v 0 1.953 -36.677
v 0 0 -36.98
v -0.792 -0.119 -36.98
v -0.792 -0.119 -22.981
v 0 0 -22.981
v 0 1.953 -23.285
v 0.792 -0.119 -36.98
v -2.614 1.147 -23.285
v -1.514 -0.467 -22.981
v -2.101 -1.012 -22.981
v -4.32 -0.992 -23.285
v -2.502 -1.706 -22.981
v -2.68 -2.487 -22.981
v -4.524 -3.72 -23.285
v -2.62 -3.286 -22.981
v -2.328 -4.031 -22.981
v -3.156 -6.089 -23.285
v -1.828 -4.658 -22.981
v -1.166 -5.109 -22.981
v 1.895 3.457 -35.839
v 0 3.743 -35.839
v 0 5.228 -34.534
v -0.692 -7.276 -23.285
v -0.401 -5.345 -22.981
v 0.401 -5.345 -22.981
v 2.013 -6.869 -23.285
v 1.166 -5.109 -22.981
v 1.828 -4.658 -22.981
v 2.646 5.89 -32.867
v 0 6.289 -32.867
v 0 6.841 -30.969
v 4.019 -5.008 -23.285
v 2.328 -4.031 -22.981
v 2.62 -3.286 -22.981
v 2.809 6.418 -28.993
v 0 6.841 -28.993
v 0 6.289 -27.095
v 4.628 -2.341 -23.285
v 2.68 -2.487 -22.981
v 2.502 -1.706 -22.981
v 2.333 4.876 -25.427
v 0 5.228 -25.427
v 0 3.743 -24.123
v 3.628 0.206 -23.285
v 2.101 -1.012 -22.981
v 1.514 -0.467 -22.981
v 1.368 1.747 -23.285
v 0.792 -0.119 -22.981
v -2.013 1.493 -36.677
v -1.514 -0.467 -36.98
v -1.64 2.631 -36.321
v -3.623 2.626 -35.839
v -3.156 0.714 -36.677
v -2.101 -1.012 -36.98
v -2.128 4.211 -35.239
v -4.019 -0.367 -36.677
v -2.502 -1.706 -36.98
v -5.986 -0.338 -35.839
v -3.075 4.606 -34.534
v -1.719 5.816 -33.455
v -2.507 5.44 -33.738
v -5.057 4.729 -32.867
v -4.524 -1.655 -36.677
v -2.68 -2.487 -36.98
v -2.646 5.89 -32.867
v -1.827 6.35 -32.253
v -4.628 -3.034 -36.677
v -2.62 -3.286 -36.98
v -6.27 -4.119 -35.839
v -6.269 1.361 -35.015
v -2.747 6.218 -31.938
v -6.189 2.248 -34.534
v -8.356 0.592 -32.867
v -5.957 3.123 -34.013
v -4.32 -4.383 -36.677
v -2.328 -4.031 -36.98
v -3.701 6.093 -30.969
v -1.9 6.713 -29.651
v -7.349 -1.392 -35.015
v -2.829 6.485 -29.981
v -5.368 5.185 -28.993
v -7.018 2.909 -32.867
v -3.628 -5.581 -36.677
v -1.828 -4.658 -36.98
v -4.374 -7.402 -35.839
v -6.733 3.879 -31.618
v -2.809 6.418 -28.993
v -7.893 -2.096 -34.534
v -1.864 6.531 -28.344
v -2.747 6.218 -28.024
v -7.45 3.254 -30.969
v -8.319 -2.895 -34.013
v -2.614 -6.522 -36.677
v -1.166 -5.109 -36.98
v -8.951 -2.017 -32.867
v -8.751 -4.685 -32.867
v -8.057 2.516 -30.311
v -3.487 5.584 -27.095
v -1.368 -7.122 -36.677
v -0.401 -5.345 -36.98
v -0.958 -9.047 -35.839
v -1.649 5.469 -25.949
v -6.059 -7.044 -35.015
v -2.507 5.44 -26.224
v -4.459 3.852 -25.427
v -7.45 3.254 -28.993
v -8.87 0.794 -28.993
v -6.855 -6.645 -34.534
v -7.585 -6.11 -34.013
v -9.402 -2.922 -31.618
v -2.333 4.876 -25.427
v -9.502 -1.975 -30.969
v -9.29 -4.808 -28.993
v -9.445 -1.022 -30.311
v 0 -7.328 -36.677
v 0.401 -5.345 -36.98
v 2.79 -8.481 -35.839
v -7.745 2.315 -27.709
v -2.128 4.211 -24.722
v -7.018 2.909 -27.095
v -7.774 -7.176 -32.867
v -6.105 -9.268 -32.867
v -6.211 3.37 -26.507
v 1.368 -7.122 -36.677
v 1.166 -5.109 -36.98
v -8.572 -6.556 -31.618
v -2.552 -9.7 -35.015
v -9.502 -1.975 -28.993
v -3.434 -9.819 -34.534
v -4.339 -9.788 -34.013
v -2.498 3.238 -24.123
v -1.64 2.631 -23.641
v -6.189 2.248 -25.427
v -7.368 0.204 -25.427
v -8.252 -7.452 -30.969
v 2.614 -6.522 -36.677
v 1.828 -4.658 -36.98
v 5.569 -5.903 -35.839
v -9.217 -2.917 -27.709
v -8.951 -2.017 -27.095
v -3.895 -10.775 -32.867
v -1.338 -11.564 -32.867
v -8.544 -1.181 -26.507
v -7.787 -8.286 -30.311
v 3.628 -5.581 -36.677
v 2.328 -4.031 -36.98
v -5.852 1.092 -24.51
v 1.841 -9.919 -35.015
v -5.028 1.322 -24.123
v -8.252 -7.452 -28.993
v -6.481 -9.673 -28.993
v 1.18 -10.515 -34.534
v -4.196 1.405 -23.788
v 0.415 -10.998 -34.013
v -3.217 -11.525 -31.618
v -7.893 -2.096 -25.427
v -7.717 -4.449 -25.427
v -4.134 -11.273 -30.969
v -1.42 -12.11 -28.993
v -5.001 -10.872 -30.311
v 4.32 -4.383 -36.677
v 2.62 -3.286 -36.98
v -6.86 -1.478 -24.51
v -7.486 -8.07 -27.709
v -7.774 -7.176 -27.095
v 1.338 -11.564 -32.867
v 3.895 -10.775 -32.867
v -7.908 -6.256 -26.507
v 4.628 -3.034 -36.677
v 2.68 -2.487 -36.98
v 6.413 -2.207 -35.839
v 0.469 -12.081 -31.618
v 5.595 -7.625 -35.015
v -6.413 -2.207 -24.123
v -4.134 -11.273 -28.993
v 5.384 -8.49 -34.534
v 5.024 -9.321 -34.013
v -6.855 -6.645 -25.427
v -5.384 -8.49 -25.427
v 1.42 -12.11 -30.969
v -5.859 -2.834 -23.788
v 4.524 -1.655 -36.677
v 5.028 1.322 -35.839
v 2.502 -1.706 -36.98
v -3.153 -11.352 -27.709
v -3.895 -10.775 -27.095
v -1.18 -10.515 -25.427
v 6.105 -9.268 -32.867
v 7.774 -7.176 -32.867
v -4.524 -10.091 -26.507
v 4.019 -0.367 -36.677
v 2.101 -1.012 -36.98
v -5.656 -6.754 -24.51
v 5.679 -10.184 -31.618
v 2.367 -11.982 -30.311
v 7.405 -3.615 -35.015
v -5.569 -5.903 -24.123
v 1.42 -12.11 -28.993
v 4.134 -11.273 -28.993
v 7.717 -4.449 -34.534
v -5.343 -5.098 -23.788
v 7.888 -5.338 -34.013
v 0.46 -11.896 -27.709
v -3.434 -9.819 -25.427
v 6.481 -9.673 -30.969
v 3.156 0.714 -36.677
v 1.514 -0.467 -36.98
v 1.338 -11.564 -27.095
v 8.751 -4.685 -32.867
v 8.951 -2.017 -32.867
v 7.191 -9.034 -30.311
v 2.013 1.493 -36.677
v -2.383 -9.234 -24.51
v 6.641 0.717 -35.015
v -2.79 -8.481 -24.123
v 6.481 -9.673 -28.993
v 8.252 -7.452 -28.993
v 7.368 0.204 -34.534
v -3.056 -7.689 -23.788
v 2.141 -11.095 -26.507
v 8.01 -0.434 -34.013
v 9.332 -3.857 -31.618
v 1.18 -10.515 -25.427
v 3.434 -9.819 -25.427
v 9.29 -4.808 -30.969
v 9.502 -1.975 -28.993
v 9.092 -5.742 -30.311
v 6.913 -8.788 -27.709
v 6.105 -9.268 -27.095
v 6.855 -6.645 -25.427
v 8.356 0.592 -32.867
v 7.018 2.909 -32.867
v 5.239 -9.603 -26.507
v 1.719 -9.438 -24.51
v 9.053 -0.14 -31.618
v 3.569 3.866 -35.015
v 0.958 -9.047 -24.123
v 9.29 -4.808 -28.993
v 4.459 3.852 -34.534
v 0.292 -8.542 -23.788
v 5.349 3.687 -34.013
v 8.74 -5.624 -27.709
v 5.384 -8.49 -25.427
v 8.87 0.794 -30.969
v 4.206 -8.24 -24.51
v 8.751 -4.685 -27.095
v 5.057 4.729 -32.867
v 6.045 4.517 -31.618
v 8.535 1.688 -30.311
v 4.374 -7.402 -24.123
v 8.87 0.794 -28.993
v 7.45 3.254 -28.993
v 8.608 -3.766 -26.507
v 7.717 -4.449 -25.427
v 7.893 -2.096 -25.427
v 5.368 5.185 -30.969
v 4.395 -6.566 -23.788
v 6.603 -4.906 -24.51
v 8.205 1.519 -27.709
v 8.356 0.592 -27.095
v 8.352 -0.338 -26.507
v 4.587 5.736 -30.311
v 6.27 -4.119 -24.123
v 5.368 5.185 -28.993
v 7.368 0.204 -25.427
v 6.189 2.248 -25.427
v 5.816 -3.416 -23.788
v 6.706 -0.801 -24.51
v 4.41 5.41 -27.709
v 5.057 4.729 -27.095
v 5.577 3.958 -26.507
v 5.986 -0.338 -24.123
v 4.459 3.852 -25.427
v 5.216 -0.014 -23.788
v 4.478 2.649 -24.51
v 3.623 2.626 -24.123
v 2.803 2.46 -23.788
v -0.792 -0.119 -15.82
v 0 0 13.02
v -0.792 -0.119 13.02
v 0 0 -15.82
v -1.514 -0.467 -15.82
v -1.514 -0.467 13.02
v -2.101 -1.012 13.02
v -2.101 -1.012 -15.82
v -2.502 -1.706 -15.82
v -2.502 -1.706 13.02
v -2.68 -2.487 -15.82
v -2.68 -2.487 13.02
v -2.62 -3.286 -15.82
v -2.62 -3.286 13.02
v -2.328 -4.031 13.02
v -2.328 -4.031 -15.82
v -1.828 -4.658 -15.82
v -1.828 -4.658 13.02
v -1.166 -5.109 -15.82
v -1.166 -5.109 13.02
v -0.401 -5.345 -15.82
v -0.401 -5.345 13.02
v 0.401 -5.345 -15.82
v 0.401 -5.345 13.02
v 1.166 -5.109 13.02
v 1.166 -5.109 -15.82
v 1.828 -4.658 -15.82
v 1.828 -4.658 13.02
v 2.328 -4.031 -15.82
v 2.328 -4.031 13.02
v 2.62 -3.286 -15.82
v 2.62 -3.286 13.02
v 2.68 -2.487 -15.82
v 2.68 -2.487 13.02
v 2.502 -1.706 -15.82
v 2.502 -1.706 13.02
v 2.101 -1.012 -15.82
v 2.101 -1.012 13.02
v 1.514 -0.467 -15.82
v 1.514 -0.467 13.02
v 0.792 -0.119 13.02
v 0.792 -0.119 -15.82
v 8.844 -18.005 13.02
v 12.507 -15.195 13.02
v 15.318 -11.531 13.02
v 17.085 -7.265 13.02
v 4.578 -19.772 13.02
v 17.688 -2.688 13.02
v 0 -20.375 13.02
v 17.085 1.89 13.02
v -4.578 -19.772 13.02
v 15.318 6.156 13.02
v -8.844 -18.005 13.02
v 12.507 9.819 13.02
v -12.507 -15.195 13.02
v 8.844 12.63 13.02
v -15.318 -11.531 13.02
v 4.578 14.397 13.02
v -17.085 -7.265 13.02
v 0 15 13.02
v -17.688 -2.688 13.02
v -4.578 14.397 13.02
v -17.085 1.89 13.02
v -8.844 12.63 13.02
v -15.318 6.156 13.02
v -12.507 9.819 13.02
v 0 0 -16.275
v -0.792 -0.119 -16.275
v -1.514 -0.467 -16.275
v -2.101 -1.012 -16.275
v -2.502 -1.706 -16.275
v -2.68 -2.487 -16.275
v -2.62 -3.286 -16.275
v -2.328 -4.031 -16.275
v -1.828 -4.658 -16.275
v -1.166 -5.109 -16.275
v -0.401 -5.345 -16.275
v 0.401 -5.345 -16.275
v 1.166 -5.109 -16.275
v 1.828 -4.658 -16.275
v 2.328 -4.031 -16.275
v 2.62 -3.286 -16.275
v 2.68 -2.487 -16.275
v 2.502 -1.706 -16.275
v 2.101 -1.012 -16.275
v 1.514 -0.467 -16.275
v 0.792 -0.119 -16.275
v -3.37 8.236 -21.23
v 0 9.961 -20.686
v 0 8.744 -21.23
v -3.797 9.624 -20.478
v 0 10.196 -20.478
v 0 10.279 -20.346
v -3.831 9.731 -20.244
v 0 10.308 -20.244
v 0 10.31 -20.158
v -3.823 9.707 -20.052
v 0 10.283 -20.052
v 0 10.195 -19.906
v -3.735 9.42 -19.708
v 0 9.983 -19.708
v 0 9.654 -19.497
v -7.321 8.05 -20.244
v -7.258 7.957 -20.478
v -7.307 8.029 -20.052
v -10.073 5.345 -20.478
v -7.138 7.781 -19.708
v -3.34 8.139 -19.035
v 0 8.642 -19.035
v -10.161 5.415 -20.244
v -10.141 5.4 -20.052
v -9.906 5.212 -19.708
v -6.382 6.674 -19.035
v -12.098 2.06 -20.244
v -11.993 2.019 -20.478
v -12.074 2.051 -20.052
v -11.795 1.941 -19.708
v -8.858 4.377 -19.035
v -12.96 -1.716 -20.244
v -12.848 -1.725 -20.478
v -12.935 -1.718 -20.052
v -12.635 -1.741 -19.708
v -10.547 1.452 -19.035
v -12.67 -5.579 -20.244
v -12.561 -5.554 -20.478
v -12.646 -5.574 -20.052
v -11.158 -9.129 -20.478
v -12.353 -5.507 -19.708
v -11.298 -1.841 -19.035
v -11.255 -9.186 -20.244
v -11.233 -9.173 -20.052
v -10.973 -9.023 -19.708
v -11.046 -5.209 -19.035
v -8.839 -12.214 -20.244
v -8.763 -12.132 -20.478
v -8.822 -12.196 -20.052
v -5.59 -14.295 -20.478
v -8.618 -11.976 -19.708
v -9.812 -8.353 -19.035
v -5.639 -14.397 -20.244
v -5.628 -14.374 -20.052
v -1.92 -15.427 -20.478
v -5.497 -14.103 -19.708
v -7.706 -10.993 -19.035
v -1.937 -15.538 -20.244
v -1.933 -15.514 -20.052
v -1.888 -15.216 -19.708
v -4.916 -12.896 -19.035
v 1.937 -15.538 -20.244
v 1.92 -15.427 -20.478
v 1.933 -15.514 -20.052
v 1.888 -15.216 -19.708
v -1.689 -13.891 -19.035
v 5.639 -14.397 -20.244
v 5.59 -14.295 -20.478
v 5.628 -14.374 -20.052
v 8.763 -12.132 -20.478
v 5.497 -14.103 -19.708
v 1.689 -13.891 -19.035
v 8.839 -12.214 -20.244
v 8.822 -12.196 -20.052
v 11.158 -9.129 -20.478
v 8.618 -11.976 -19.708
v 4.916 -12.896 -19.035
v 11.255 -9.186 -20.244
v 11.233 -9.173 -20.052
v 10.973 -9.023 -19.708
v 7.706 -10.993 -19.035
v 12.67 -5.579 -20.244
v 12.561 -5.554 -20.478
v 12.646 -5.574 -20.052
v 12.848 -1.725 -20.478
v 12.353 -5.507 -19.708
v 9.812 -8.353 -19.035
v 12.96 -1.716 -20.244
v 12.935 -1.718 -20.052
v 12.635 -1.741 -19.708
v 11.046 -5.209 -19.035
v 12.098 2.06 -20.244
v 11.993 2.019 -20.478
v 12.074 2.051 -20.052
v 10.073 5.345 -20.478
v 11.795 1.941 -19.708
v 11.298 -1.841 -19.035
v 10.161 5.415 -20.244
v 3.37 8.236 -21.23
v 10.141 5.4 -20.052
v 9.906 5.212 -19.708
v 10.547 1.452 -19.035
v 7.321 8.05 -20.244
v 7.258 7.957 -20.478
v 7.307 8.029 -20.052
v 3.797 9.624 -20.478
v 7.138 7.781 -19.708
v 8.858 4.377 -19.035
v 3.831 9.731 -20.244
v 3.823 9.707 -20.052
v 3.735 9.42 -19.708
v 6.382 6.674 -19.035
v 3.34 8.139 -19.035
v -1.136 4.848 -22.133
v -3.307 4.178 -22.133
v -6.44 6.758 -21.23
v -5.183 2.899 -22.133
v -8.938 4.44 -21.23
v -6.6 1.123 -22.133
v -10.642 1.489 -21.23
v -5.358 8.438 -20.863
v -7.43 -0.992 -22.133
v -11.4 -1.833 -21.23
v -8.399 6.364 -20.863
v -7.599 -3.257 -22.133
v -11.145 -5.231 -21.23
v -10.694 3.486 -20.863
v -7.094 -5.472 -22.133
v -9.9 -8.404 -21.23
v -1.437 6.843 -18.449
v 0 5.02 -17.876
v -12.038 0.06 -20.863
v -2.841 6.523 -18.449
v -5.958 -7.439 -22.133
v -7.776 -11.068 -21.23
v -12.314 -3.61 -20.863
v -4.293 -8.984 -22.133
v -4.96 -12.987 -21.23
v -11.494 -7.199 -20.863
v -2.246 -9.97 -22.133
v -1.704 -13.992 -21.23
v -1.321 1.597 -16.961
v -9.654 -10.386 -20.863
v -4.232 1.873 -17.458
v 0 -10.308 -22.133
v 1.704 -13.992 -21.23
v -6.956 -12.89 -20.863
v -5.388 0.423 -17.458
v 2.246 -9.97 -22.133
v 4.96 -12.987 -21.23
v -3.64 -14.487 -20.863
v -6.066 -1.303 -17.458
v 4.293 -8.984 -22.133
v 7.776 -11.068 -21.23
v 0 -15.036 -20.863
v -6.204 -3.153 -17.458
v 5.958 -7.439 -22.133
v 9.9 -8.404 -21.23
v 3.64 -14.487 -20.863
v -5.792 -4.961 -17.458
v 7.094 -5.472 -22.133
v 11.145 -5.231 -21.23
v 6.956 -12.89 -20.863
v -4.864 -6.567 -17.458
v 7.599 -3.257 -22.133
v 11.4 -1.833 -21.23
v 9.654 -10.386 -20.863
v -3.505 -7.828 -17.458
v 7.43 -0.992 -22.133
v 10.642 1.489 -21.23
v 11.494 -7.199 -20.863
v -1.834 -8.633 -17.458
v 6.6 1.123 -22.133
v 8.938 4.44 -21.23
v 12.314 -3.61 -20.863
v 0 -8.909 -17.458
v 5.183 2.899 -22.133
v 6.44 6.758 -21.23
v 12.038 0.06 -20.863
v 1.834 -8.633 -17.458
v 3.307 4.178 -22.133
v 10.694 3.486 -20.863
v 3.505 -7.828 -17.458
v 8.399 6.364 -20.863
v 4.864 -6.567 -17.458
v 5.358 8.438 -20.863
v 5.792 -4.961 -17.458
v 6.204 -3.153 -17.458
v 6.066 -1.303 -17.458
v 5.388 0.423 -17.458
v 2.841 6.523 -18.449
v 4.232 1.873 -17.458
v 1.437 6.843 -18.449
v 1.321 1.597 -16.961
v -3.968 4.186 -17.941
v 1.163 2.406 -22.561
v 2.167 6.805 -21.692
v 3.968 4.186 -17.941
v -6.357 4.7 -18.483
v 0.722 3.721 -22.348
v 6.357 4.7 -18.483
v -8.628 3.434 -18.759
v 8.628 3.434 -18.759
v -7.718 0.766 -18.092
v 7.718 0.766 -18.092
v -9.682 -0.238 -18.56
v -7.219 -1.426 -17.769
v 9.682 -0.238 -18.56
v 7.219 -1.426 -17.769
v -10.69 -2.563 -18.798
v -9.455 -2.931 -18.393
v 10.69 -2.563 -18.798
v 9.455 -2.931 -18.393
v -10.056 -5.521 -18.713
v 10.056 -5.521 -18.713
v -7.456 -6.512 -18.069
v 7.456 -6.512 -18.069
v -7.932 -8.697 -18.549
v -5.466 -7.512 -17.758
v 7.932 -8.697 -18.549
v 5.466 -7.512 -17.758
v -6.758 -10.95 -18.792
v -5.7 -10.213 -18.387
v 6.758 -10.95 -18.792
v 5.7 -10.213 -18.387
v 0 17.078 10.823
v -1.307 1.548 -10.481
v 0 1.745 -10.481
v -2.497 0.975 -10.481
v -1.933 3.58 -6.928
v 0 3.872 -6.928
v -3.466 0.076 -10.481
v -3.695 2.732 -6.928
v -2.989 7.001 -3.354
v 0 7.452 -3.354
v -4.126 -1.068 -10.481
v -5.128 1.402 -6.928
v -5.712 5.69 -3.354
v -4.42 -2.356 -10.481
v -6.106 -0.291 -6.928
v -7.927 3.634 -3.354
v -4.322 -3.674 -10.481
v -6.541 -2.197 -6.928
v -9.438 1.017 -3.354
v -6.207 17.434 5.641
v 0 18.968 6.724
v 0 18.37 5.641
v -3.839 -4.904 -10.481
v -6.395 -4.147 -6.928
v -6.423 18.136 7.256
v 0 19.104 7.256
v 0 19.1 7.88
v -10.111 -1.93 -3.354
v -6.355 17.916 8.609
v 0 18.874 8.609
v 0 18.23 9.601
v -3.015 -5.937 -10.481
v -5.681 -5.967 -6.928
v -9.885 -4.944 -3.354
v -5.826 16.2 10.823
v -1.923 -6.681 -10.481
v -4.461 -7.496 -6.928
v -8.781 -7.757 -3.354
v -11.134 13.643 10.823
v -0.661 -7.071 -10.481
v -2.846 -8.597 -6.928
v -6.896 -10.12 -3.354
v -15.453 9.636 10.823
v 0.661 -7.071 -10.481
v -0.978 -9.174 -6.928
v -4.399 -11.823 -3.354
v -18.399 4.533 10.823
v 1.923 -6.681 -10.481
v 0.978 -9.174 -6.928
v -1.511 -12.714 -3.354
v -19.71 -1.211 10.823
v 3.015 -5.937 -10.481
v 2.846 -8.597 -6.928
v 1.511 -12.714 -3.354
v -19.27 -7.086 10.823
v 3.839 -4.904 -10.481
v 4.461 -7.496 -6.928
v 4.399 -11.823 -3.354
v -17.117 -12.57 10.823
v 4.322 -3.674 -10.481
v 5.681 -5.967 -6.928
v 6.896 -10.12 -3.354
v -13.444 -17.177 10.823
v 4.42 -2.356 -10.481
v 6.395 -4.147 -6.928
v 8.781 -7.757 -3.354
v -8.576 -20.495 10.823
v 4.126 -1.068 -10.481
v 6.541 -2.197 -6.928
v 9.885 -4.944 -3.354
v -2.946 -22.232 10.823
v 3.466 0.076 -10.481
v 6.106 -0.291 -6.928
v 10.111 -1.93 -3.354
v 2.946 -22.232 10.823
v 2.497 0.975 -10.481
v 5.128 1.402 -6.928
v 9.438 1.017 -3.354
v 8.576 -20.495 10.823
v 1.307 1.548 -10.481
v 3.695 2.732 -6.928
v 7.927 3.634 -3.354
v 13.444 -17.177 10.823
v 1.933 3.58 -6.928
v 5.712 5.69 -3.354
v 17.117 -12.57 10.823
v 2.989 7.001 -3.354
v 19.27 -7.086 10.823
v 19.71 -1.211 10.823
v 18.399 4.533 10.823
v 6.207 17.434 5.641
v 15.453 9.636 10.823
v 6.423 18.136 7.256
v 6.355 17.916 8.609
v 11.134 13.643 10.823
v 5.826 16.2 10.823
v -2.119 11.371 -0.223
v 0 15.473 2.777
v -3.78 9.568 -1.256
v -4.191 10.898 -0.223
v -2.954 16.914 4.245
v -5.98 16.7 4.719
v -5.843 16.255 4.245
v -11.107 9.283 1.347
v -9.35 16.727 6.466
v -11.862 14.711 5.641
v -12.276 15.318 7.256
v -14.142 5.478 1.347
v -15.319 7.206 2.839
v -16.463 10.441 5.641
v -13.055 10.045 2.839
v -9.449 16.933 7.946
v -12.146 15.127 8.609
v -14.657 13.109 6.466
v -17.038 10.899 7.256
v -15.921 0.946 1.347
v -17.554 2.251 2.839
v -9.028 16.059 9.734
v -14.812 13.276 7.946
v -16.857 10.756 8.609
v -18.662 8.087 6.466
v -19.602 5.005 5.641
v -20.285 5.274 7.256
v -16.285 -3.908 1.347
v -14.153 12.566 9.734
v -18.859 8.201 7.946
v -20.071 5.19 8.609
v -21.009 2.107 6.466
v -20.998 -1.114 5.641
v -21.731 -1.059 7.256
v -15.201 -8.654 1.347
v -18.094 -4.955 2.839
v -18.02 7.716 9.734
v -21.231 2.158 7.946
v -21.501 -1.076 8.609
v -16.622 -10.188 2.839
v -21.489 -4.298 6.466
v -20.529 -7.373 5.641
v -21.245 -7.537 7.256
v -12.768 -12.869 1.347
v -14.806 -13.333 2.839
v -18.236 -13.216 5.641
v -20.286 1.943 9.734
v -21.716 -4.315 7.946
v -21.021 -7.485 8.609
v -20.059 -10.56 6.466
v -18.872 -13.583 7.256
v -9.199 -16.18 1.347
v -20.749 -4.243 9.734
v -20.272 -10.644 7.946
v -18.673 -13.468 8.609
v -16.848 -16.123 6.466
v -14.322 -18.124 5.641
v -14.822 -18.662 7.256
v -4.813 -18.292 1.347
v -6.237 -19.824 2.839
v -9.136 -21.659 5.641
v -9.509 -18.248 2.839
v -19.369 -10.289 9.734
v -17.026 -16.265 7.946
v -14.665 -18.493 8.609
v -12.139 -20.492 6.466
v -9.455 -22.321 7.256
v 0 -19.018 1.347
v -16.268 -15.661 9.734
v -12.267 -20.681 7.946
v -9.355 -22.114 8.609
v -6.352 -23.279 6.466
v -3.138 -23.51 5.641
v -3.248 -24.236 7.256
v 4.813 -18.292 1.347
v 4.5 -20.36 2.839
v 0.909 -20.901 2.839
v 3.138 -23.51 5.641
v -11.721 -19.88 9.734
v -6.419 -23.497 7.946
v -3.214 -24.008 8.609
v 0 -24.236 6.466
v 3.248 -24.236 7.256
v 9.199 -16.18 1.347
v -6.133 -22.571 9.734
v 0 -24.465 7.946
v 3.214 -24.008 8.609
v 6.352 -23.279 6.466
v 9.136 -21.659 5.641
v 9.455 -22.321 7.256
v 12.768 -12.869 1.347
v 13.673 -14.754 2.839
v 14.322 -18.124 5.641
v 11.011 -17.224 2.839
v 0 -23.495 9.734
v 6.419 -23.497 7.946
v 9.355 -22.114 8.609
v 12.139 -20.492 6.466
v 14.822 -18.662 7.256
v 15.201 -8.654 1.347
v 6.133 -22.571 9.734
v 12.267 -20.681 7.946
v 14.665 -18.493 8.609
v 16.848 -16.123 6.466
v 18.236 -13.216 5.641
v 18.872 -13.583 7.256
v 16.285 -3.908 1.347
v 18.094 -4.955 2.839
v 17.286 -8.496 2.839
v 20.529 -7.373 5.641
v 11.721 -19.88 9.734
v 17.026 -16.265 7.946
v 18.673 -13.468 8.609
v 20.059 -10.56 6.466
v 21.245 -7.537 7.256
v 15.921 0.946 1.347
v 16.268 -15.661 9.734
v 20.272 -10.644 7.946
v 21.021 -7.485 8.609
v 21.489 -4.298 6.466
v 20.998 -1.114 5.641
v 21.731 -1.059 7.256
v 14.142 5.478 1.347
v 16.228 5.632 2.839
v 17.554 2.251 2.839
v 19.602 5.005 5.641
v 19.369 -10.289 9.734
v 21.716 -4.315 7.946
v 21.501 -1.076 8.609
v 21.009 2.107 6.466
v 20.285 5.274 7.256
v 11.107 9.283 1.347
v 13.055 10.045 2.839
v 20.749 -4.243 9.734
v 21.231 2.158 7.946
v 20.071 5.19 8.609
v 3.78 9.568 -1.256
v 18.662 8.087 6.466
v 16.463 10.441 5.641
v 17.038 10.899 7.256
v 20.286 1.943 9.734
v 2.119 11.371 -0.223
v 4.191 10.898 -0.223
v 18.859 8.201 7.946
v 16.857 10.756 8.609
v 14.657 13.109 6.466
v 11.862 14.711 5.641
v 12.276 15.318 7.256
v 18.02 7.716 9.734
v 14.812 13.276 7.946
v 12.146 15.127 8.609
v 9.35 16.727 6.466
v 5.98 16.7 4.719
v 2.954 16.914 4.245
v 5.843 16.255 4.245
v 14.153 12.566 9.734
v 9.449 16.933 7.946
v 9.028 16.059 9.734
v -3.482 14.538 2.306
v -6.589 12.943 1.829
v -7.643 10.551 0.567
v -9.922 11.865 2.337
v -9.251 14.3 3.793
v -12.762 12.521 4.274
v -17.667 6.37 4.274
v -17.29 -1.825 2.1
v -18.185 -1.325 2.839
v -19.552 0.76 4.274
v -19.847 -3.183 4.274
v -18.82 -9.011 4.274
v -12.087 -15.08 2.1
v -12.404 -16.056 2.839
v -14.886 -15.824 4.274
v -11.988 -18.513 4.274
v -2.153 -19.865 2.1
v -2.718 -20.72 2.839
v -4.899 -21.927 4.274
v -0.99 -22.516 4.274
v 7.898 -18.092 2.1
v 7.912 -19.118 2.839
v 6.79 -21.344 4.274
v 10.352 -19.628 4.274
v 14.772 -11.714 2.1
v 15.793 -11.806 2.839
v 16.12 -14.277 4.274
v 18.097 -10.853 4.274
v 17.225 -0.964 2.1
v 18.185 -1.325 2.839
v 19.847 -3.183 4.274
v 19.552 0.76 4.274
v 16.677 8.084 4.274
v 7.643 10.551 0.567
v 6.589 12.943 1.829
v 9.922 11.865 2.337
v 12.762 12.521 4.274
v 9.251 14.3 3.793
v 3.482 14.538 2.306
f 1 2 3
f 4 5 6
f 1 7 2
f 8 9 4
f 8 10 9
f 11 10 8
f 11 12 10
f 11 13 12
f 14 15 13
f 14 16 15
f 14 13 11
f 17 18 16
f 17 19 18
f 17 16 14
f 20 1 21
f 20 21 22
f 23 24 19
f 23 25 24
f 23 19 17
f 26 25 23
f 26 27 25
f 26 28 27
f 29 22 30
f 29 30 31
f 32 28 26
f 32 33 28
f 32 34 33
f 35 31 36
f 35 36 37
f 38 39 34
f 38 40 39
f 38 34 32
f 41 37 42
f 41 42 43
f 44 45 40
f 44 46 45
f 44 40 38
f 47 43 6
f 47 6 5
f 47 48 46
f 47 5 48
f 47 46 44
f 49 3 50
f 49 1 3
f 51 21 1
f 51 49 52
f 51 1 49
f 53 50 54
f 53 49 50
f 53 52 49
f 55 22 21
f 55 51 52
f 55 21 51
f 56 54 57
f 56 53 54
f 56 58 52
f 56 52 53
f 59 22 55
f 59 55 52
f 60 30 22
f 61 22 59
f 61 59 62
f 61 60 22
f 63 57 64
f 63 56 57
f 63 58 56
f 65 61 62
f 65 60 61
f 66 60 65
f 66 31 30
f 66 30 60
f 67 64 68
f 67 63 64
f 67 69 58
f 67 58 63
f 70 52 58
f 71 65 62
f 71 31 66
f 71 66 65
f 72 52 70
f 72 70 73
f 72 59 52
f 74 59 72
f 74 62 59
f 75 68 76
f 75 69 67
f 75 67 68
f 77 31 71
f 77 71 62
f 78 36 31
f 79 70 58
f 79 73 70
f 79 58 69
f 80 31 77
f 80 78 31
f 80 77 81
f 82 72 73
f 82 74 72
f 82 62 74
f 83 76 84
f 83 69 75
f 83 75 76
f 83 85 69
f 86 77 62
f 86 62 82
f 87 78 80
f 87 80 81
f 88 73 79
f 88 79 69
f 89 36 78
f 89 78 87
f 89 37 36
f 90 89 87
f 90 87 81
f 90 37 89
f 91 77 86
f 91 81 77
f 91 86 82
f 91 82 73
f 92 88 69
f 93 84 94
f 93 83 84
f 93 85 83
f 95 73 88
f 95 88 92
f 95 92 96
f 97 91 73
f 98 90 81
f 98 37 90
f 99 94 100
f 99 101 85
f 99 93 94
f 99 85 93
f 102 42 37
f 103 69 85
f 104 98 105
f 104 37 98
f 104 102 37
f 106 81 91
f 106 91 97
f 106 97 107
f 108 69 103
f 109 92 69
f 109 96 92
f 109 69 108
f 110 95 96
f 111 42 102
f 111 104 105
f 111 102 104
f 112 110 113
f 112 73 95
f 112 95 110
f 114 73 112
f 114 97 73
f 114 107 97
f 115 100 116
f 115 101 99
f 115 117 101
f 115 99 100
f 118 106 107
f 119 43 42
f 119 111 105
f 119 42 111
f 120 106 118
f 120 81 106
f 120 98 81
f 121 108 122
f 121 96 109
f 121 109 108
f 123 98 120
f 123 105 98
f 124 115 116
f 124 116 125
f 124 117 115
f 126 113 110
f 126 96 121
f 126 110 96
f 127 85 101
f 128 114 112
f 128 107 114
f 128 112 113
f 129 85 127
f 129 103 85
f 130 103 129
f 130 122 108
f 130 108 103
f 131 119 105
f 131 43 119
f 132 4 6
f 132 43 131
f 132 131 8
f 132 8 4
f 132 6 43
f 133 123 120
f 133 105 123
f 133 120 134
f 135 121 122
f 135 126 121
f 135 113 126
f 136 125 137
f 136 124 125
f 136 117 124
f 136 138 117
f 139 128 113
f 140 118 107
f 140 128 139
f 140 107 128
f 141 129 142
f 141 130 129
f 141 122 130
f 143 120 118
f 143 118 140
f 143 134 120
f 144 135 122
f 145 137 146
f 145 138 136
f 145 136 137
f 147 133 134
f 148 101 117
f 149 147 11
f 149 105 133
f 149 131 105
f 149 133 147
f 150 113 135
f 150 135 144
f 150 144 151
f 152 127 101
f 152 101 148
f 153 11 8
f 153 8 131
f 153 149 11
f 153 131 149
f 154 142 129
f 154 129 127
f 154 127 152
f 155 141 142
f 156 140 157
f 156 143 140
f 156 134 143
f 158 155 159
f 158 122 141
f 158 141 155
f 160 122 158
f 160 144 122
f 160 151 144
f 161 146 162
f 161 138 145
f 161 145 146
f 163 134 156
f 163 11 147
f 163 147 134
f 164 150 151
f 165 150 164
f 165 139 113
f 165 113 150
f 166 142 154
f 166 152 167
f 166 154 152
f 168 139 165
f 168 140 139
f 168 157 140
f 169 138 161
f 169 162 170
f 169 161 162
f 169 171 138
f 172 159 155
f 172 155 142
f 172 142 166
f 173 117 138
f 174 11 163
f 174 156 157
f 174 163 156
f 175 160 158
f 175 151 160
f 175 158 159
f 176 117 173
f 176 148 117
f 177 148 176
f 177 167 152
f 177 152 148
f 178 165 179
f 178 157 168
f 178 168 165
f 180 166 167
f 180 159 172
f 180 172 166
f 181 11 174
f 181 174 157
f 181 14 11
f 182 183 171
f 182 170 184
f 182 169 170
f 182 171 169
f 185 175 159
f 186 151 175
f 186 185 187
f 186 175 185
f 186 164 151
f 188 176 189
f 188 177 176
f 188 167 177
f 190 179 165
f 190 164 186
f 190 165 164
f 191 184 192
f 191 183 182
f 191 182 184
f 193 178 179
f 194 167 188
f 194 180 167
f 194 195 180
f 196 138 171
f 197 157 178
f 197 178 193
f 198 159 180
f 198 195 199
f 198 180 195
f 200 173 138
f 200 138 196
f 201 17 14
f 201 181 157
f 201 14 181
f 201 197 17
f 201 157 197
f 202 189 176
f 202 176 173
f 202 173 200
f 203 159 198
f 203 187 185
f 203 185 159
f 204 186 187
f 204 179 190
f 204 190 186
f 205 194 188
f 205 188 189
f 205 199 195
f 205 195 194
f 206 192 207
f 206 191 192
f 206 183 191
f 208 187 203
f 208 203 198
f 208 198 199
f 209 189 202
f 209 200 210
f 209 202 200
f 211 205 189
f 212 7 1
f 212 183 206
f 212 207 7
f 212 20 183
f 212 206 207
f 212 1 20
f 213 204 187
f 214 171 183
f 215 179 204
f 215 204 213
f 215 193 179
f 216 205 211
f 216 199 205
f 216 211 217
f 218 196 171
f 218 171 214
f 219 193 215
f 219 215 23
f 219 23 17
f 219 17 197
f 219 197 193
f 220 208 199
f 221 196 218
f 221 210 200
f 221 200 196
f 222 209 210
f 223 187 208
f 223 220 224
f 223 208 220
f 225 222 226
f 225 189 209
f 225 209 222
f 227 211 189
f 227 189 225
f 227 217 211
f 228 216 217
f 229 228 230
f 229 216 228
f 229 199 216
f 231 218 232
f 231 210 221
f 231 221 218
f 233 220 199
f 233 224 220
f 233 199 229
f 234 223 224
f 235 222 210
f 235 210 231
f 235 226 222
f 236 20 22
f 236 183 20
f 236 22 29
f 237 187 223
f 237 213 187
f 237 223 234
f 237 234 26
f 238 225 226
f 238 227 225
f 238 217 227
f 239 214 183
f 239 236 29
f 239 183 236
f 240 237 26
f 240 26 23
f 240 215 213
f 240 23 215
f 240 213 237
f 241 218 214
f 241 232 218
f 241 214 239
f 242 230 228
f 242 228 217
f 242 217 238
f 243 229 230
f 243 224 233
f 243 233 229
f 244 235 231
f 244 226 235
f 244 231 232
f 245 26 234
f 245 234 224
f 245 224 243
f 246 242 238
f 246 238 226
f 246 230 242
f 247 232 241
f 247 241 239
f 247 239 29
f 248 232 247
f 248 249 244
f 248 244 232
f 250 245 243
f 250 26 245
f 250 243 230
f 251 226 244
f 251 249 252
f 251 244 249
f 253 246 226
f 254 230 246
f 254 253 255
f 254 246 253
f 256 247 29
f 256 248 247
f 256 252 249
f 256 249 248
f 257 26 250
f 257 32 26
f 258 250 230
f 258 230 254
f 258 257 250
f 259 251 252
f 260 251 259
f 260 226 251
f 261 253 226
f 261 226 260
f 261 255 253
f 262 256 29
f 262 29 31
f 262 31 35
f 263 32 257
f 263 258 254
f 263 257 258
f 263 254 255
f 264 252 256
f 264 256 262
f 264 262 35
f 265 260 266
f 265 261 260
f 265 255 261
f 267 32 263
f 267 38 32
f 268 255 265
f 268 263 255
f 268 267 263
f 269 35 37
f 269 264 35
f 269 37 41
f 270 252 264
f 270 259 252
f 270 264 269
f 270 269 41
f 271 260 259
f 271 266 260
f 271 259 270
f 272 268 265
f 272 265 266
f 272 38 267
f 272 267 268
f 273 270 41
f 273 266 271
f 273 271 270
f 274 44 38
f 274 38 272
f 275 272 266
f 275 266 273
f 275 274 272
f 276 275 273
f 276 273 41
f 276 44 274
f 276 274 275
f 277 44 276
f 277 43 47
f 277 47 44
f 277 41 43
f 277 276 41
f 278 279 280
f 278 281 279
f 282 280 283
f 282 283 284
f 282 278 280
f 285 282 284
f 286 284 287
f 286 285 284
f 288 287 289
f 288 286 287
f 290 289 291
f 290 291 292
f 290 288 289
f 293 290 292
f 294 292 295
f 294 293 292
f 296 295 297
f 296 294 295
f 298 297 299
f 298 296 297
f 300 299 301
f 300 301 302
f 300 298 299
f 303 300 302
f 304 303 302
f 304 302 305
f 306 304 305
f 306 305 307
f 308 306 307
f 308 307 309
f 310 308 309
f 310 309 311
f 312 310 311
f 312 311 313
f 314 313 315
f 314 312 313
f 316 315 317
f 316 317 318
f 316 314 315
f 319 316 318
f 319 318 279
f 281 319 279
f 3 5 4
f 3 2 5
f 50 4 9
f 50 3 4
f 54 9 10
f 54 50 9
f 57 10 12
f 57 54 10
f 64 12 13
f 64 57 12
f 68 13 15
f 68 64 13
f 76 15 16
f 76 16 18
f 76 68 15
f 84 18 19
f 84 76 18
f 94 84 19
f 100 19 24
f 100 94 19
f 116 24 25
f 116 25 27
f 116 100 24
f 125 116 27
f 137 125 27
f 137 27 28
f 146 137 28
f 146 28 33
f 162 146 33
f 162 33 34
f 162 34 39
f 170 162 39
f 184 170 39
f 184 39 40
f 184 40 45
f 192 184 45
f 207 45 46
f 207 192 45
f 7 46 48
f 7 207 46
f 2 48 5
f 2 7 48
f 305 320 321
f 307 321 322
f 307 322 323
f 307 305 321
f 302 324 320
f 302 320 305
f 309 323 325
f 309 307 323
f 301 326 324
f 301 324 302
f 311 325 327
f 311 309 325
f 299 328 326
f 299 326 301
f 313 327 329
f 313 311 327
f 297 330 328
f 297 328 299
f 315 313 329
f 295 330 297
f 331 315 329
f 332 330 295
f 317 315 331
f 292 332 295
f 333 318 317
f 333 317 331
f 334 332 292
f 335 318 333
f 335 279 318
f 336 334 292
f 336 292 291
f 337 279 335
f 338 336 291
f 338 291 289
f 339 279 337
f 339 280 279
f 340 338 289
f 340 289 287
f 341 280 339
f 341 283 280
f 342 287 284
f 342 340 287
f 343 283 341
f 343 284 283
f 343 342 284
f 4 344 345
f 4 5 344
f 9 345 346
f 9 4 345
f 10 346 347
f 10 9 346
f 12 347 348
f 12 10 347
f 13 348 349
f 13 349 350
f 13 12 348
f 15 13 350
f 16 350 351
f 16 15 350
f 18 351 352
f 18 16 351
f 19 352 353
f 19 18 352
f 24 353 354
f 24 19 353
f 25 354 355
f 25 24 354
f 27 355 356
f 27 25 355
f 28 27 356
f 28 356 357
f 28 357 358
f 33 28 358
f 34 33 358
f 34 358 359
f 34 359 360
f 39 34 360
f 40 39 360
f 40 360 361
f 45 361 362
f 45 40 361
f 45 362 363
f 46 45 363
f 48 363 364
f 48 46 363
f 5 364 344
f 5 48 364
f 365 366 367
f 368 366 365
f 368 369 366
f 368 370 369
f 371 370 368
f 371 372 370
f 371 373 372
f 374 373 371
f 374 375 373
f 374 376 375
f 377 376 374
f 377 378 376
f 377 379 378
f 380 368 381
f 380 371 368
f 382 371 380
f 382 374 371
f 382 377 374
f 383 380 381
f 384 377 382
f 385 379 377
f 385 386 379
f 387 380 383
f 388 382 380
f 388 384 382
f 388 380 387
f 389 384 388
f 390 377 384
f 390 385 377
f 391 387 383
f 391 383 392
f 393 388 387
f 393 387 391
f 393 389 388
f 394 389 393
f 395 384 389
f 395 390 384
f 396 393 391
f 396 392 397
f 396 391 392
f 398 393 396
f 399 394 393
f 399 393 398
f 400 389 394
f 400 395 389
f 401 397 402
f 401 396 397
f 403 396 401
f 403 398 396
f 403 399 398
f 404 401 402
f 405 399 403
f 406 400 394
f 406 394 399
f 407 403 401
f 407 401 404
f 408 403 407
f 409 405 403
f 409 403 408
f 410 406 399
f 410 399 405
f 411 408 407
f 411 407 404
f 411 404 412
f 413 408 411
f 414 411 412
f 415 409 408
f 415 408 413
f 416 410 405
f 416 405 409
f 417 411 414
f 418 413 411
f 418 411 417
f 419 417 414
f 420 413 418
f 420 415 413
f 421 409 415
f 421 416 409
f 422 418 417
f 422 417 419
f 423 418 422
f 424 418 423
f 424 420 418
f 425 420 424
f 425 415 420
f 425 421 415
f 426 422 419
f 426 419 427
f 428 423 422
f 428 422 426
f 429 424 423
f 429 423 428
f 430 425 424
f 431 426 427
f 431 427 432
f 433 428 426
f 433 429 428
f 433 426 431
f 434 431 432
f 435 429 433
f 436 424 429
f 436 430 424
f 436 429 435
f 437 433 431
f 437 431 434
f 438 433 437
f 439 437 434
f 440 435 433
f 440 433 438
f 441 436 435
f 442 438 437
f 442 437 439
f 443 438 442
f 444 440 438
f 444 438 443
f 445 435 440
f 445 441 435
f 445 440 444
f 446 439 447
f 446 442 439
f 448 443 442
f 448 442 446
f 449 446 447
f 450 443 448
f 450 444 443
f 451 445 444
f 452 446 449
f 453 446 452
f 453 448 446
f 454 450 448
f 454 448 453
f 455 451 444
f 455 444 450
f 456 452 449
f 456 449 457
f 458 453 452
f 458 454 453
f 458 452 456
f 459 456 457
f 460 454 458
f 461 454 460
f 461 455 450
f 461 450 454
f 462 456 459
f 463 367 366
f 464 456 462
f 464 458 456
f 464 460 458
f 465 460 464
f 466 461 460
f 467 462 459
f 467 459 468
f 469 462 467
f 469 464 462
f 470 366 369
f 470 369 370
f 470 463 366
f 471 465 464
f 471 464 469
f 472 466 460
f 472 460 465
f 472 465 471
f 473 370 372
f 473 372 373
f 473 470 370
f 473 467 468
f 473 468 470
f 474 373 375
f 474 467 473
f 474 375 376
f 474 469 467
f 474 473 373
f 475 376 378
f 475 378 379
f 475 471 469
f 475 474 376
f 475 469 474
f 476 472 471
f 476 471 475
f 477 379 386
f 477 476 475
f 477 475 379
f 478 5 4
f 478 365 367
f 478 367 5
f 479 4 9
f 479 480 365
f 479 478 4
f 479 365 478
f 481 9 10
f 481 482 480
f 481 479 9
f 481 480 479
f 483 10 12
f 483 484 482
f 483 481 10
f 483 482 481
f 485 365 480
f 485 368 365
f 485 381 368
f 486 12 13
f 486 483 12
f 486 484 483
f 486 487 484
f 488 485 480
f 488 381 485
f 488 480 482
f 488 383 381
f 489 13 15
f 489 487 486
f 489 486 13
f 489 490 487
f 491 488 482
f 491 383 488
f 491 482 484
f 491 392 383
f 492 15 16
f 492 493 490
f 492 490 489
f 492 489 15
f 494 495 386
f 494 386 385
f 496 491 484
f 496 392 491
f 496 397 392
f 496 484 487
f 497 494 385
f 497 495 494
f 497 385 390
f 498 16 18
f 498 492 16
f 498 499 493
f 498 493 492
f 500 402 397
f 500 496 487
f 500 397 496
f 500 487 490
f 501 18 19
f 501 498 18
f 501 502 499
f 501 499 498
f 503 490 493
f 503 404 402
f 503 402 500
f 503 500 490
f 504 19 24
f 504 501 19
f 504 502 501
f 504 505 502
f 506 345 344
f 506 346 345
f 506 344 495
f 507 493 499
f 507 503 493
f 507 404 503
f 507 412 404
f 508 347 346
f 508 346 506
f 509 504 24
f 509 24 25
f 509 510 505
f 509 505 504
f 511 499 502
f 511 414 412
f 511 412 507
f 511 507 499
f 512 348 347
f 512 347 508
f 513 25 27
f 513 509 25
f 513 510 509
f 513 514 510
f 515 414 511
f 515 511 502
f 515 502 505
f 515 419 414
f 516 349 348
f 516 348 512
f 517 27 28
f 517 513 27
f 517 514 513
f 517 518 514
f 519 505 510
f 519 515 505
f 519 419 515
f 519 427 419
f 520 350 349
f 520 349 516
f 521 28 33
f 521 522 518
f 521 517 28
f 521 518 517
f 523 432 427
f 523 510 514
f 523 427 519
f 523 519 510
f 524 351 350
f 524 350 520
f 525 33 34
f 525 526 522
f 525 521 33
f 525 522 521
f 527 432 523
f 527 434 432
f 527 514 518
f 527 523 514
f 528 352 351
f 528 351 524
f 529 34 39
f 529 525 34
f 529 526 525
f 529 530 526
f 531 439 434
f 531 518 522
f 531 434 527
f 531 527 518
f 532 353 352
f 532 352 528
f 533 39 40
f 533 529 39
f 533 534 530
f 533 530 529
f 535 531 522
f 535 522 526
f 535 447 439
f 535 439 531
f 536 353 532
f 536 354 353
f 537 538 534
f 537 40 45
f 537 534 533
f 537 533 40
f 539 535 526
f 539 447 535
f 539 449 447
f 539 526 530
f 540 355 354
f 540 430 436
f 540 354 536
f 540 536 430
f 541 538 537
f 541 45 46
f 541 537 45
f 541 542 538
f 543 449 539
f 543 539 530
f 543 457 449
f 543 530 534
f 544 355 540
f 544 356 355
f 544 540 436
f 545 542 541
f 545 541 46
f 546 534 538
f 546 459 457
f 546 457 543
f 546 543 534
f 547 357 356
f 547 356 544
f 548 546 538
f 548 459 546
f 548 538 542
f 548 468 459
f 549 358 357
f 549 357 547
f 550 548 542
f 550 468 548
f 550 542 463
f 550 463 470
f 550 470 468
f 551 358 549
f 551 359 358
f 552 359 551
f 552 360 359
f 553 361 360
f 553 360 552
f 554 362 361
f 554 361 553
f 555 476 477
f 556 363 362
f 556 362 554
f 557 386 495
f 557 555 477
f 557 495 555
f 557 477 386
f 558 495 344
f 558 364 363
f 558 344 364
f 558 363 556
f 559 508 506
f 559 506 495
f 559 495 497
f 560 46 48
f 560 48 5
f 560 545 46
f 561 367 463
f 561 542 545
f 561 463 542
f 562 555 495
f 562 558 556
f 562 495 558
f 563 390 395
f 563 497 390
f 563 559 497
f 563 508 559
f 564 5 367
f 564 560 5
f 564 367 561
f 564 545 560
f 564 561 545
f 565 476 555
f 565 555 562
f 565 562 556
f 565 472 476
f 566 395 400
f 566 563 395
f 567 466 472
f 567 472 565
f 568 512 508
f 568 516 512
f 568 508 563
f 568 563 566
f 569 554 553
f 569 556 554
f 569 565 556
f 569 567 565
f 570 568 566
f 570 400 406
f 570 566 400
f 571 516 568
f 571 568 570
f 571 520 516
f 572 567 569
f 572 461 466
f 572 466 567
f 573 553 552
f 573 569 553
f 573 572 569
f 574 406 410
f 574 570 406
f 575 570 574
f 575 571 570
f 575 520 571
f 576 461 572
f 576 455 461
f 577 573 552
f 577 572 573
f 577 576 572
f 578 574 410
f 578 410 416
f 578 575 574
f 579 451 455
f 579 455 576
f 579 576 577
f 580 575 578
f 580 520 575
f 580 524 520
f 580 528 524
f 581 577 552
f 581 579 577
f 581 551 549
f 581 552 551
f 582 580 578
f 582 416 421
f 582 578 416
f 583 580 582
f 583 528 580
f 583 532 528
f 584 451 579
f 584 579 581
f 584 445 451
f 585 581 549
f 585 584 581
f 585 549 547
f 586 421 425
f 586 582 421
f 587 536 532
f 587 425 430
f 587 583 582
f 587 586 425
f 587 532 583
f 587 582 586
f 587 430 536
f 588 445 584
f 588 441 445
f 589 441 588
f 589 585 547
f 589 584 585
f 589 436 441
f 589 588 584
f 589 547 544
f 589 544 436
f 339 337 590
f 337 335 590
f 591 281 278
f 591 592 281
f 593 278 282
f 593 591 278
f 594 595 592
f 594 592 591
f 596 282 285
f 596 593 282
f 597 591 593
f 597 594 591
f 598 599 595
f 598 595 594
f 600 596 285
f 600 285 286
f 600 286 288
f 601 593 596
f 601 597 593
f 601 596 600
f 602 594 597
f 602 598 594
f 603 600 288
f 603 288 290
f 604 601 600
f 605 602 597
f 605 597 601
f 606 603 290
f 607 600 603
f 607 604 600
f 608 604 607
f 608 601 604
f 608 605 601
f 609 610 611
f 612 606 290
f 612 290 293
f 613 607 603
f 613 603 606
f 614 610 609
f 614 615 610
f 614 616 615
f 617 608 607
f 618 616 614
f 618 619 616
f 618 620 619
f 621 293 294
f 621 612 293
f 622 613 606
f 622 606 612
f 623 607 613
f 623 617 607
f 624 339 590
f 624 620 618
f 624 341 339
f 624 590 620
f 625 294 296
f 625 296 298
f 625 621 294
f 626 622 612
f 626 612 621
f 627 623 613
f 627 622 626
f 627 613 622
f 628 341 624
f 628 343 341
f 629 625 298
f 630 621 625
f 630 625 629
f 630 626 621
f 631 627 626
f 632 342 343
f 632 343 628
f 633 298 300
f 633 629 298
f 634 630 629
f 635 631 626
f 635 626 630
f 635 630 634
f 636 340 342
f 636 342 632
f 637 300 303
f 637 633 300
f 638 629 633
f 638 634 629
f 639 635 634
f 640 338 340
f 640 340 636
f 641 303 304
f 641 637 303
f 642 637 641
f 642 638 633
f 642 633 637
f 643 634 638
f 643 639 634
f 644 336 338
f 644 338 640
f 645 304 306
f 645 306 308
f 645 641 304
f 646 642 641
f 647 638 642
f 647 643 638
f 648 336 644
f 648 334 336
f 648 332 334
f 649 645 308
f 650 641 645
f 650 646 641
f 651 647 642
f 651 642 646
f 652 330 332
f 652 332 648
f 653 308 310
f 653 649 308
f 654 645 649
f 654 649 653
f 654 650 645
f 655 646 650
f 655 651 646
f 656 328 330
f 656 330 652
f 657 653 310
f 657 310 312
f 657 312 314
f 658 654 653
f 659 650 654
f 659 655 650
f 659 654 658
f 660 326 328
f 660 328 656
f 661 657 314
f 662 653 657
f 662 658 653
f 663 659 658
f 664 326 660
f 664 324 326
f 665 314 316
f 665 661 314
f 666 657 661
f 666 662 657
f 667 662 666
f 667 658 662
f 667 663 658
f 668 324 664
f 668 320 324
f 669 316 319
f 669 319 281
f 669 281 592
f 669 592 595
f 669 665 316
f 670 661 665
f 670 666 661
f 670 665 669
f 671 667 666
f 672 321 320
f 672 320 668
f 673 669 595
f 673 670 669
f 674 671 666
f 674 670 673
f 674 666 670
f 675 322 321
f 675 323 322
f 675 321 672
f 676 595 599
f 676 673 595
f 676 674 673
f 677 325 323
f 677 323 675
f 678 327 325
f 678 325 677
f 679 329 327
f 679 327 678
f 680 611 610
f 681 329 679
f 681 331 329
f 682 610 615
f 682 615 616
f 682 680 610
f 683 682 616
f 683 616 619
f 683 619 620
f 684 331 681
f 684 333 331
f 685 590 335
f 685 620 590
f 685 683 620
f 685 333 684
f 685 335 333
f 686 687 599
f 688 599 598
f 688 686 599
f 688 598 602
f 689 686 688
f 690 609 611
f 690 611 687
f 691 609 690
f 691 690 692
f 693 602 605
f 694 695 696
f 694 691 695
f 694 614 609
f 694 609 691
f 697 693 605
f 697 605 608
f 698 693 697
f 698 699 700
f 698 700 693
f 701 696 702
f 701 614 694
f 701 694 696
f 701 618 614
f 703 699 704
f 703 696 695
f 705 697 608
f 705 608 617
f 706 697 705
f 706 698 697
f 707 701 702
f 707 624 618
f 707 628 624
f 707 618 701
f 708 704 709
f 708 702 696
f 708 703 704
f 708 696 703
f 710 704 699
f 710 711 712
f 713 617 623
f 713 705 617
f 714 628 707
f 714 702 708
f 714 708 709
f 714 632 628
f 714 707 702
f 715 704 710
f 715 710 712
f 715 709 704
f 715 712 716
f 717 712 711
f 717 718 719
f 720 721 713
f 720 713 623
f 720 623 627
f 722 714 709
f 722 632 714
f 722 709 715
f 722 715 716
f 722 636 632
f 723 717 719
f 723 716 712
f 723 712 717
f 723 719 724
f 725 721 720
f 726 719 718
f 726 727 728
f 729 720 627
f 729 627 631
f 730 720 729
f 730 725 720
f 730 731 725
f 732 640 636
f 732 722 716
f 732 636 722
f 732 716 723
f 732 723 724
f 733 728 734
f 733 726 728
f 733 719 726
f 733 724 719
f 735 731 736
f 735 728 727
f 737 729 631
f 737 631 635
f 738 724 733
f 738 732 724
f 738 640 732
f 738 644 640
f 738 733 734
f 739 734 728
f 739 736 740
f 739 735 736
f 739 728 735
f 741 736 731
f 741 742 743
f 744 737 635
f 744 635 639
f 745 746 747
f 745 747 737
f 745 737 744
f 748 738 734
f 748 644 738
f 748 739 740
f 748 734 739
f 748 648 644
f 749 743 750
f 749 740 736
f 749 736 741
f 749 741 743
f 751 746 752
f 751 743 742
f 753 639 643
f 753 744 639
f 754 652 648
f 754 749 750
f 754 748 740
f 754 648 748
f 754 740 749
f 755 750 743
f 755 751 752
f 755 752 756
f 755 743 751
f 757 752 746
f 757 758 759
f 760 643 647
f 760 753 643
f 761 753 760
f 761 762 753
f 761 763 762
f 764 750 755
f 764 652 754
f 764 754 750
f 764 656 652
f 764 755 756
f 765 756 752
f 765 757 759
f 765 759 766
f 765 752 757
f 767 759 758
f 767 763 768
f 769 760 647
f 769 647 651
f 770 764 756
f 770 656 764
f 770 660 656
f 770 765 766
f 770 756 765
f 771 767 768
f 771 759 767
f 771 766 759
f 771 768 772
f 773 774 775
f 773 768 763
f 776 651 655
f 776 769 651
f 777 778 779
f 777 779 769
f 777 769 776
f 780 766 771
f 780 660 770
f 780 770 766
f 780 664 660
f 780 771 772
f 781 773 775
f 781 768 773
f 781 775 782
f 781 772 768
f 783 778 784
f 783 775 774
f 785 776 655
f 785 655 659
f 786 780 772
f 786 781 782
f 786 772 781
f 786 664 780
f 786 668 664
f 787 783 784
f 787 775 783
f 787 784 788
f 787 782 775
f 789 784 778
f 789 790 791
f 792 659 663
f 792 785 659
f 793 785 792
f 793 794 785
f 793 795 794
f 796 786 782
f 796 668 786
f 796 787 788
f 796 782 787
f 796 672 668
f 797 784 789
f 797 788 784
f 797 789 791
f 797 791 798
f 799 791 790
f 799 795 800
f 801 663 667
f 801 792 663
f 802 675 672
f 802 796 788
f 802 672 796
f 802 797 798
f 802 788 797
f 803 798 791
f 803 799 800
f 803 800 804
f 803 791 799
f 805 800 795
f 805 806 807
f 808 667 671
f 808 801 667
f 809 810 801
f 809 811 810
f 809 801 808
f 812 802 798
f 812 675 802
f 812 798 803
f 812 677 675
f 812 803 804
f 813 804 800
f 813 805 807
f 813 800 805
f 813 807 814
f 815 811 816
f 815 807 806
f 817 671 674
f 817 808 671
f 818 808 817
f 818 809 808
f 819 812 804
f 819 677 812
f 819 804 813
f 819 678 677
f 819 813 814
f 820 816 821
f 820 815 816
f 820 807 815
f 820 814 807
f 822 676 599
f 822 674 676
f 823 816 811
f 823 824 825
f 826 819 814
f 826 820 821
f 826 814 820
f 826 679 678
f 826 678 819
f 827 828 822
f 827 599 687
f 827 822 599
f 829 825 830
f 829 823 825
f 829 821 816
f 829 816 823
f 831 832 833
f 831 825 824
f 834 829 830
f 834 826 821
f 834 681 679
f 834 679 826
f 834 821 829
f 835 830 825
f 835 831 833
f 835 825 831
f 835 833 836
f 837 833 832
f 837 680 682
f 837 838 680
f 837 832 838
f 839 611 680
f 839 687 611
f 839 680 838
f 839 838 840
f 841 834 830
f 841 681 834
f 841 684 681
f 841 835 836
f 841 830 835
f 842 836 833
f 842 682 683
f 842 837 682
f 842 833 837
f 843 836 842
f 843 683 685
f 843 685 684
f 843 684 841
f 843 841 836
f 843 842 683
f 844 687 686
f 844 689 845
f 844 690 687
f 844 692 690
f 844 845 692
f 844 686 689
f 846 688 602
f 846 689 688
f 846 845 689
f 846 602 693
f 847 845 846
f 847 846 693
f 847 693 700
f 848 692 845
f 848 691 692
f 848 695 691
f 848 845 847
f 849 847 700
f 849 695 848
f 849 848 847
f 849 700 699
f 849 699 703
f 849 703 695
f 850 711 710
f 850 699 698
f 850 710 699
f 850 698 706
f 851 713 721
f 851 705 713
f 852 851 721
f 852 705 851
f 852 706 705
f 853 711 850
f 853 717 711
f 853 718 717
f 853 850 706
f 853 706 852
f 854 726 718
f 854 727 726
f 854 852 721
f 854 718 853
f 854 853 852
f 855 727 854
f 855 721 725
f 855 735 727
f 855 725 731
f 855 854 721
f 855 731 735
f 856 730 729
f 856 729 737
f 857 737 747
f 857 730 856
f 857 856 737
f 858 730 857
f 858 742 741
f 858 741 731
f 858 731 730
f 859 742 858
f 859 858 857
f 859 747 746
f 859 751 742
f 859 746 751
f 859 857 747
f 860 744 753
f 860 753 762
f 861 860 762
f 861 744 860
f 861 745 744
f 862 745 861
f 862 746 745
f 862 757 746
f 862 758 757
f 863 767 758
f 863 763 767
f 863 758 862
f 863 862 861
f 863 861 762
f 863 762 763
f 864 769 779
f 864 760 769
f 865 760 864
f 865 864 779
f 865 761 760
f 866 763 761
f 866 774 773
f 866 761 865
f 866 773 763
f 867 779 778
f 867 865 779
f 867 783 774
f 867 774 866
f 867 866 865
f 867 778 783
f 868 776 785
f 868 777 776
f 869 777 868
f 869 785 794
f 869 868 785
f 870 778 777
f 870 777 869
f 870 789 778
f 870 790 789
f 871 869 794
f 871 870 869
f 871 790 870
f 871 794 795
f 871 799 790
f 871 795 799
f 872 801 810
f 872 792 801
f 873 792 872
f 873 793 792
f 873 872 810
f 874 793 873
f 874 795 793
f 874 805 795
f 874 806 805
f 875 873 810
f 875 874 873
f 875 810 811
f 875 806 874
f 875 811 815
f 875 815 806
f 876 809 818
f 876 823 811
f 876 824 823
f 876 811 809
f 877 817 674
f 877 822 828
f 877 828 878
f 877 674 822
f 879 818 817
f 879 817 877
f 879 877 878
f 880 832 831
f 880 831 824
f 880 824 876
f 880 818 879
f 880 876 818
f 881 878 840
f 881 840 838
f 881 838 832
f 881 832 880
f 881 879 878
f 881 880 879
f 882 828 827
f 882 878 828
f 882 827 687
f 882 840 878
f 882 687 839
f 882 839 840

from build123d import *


with BuildPart() as f1:
    # F0 (on Right) → F1 (revolve)
    with BuildSketch(Plane.YZ):
        with BuildLine():
            Line((0, 13.0196327599), (0, -15.820335771))
            add(Edge.make_bspline(
                [(0, -15.820335771), (0.9483472479, -12.3530663624), (2.9142217394, -4.3031595803), (24.1643272847, 6.703975096), (16.3854773323, 11.0956474022), (15, 13.0196327599)],
                knots=[0.0077370555, 0.0077370555, 0.0077370555, 0.0077370555, 0.3333793249, 0.7461959182, 1, 1, 1, 1], degree=3))
            Line((15, 13.0196327599), (0, 13.0196327599))
        make_face()
    revolve(axis=Axis((0, -2.6875874028, -12.178337574), (0, 0, 1)))


with BuildPart() as f1b:
    # F0 (on Right) → F1, piece 2 (revolve)
    with BuildSketch(Plane.YZ):
        with BuildLine():
            Line((0, -16.2748545408), (0, -22.9814901708))
            add(Edge.make_bspline(
                [(0, -22.9814901708), (5.6699117439, -22.051949532), (17.0481207367, -20.186575231), (0.8138854669, -16.9738926898), (0, -16.2748545408)],
                knots=[0, 0, 0, 0, 0.459889414, 0.9228922958, 0.9228922958, 0.9228922958, 0.9228922958], degree=3))
        make_face()
    revolve(axis=Axis((0, -2.6875874028, -12.178337574), (0, 0, 1)))


with BuildPart() as f1c:
    # F0 (on Right) → F1, piece 3 (revolve)
    with BuildSketch(Plane.YZ):
        with BuildLine():
            Line((0, -22.9814901708), (0, -36.9803672401))
            ThreePointArc((0, -36.9803672401), (6.9113422342, -29.9809287055), (0, -22.9814901708))
        make_face()
    revolve(axis=Axis((0, -2.6875874028, -12.178337574), (0, 0, 1)))


solid = Compound([f1.part, f1b.part, f1c.part])
